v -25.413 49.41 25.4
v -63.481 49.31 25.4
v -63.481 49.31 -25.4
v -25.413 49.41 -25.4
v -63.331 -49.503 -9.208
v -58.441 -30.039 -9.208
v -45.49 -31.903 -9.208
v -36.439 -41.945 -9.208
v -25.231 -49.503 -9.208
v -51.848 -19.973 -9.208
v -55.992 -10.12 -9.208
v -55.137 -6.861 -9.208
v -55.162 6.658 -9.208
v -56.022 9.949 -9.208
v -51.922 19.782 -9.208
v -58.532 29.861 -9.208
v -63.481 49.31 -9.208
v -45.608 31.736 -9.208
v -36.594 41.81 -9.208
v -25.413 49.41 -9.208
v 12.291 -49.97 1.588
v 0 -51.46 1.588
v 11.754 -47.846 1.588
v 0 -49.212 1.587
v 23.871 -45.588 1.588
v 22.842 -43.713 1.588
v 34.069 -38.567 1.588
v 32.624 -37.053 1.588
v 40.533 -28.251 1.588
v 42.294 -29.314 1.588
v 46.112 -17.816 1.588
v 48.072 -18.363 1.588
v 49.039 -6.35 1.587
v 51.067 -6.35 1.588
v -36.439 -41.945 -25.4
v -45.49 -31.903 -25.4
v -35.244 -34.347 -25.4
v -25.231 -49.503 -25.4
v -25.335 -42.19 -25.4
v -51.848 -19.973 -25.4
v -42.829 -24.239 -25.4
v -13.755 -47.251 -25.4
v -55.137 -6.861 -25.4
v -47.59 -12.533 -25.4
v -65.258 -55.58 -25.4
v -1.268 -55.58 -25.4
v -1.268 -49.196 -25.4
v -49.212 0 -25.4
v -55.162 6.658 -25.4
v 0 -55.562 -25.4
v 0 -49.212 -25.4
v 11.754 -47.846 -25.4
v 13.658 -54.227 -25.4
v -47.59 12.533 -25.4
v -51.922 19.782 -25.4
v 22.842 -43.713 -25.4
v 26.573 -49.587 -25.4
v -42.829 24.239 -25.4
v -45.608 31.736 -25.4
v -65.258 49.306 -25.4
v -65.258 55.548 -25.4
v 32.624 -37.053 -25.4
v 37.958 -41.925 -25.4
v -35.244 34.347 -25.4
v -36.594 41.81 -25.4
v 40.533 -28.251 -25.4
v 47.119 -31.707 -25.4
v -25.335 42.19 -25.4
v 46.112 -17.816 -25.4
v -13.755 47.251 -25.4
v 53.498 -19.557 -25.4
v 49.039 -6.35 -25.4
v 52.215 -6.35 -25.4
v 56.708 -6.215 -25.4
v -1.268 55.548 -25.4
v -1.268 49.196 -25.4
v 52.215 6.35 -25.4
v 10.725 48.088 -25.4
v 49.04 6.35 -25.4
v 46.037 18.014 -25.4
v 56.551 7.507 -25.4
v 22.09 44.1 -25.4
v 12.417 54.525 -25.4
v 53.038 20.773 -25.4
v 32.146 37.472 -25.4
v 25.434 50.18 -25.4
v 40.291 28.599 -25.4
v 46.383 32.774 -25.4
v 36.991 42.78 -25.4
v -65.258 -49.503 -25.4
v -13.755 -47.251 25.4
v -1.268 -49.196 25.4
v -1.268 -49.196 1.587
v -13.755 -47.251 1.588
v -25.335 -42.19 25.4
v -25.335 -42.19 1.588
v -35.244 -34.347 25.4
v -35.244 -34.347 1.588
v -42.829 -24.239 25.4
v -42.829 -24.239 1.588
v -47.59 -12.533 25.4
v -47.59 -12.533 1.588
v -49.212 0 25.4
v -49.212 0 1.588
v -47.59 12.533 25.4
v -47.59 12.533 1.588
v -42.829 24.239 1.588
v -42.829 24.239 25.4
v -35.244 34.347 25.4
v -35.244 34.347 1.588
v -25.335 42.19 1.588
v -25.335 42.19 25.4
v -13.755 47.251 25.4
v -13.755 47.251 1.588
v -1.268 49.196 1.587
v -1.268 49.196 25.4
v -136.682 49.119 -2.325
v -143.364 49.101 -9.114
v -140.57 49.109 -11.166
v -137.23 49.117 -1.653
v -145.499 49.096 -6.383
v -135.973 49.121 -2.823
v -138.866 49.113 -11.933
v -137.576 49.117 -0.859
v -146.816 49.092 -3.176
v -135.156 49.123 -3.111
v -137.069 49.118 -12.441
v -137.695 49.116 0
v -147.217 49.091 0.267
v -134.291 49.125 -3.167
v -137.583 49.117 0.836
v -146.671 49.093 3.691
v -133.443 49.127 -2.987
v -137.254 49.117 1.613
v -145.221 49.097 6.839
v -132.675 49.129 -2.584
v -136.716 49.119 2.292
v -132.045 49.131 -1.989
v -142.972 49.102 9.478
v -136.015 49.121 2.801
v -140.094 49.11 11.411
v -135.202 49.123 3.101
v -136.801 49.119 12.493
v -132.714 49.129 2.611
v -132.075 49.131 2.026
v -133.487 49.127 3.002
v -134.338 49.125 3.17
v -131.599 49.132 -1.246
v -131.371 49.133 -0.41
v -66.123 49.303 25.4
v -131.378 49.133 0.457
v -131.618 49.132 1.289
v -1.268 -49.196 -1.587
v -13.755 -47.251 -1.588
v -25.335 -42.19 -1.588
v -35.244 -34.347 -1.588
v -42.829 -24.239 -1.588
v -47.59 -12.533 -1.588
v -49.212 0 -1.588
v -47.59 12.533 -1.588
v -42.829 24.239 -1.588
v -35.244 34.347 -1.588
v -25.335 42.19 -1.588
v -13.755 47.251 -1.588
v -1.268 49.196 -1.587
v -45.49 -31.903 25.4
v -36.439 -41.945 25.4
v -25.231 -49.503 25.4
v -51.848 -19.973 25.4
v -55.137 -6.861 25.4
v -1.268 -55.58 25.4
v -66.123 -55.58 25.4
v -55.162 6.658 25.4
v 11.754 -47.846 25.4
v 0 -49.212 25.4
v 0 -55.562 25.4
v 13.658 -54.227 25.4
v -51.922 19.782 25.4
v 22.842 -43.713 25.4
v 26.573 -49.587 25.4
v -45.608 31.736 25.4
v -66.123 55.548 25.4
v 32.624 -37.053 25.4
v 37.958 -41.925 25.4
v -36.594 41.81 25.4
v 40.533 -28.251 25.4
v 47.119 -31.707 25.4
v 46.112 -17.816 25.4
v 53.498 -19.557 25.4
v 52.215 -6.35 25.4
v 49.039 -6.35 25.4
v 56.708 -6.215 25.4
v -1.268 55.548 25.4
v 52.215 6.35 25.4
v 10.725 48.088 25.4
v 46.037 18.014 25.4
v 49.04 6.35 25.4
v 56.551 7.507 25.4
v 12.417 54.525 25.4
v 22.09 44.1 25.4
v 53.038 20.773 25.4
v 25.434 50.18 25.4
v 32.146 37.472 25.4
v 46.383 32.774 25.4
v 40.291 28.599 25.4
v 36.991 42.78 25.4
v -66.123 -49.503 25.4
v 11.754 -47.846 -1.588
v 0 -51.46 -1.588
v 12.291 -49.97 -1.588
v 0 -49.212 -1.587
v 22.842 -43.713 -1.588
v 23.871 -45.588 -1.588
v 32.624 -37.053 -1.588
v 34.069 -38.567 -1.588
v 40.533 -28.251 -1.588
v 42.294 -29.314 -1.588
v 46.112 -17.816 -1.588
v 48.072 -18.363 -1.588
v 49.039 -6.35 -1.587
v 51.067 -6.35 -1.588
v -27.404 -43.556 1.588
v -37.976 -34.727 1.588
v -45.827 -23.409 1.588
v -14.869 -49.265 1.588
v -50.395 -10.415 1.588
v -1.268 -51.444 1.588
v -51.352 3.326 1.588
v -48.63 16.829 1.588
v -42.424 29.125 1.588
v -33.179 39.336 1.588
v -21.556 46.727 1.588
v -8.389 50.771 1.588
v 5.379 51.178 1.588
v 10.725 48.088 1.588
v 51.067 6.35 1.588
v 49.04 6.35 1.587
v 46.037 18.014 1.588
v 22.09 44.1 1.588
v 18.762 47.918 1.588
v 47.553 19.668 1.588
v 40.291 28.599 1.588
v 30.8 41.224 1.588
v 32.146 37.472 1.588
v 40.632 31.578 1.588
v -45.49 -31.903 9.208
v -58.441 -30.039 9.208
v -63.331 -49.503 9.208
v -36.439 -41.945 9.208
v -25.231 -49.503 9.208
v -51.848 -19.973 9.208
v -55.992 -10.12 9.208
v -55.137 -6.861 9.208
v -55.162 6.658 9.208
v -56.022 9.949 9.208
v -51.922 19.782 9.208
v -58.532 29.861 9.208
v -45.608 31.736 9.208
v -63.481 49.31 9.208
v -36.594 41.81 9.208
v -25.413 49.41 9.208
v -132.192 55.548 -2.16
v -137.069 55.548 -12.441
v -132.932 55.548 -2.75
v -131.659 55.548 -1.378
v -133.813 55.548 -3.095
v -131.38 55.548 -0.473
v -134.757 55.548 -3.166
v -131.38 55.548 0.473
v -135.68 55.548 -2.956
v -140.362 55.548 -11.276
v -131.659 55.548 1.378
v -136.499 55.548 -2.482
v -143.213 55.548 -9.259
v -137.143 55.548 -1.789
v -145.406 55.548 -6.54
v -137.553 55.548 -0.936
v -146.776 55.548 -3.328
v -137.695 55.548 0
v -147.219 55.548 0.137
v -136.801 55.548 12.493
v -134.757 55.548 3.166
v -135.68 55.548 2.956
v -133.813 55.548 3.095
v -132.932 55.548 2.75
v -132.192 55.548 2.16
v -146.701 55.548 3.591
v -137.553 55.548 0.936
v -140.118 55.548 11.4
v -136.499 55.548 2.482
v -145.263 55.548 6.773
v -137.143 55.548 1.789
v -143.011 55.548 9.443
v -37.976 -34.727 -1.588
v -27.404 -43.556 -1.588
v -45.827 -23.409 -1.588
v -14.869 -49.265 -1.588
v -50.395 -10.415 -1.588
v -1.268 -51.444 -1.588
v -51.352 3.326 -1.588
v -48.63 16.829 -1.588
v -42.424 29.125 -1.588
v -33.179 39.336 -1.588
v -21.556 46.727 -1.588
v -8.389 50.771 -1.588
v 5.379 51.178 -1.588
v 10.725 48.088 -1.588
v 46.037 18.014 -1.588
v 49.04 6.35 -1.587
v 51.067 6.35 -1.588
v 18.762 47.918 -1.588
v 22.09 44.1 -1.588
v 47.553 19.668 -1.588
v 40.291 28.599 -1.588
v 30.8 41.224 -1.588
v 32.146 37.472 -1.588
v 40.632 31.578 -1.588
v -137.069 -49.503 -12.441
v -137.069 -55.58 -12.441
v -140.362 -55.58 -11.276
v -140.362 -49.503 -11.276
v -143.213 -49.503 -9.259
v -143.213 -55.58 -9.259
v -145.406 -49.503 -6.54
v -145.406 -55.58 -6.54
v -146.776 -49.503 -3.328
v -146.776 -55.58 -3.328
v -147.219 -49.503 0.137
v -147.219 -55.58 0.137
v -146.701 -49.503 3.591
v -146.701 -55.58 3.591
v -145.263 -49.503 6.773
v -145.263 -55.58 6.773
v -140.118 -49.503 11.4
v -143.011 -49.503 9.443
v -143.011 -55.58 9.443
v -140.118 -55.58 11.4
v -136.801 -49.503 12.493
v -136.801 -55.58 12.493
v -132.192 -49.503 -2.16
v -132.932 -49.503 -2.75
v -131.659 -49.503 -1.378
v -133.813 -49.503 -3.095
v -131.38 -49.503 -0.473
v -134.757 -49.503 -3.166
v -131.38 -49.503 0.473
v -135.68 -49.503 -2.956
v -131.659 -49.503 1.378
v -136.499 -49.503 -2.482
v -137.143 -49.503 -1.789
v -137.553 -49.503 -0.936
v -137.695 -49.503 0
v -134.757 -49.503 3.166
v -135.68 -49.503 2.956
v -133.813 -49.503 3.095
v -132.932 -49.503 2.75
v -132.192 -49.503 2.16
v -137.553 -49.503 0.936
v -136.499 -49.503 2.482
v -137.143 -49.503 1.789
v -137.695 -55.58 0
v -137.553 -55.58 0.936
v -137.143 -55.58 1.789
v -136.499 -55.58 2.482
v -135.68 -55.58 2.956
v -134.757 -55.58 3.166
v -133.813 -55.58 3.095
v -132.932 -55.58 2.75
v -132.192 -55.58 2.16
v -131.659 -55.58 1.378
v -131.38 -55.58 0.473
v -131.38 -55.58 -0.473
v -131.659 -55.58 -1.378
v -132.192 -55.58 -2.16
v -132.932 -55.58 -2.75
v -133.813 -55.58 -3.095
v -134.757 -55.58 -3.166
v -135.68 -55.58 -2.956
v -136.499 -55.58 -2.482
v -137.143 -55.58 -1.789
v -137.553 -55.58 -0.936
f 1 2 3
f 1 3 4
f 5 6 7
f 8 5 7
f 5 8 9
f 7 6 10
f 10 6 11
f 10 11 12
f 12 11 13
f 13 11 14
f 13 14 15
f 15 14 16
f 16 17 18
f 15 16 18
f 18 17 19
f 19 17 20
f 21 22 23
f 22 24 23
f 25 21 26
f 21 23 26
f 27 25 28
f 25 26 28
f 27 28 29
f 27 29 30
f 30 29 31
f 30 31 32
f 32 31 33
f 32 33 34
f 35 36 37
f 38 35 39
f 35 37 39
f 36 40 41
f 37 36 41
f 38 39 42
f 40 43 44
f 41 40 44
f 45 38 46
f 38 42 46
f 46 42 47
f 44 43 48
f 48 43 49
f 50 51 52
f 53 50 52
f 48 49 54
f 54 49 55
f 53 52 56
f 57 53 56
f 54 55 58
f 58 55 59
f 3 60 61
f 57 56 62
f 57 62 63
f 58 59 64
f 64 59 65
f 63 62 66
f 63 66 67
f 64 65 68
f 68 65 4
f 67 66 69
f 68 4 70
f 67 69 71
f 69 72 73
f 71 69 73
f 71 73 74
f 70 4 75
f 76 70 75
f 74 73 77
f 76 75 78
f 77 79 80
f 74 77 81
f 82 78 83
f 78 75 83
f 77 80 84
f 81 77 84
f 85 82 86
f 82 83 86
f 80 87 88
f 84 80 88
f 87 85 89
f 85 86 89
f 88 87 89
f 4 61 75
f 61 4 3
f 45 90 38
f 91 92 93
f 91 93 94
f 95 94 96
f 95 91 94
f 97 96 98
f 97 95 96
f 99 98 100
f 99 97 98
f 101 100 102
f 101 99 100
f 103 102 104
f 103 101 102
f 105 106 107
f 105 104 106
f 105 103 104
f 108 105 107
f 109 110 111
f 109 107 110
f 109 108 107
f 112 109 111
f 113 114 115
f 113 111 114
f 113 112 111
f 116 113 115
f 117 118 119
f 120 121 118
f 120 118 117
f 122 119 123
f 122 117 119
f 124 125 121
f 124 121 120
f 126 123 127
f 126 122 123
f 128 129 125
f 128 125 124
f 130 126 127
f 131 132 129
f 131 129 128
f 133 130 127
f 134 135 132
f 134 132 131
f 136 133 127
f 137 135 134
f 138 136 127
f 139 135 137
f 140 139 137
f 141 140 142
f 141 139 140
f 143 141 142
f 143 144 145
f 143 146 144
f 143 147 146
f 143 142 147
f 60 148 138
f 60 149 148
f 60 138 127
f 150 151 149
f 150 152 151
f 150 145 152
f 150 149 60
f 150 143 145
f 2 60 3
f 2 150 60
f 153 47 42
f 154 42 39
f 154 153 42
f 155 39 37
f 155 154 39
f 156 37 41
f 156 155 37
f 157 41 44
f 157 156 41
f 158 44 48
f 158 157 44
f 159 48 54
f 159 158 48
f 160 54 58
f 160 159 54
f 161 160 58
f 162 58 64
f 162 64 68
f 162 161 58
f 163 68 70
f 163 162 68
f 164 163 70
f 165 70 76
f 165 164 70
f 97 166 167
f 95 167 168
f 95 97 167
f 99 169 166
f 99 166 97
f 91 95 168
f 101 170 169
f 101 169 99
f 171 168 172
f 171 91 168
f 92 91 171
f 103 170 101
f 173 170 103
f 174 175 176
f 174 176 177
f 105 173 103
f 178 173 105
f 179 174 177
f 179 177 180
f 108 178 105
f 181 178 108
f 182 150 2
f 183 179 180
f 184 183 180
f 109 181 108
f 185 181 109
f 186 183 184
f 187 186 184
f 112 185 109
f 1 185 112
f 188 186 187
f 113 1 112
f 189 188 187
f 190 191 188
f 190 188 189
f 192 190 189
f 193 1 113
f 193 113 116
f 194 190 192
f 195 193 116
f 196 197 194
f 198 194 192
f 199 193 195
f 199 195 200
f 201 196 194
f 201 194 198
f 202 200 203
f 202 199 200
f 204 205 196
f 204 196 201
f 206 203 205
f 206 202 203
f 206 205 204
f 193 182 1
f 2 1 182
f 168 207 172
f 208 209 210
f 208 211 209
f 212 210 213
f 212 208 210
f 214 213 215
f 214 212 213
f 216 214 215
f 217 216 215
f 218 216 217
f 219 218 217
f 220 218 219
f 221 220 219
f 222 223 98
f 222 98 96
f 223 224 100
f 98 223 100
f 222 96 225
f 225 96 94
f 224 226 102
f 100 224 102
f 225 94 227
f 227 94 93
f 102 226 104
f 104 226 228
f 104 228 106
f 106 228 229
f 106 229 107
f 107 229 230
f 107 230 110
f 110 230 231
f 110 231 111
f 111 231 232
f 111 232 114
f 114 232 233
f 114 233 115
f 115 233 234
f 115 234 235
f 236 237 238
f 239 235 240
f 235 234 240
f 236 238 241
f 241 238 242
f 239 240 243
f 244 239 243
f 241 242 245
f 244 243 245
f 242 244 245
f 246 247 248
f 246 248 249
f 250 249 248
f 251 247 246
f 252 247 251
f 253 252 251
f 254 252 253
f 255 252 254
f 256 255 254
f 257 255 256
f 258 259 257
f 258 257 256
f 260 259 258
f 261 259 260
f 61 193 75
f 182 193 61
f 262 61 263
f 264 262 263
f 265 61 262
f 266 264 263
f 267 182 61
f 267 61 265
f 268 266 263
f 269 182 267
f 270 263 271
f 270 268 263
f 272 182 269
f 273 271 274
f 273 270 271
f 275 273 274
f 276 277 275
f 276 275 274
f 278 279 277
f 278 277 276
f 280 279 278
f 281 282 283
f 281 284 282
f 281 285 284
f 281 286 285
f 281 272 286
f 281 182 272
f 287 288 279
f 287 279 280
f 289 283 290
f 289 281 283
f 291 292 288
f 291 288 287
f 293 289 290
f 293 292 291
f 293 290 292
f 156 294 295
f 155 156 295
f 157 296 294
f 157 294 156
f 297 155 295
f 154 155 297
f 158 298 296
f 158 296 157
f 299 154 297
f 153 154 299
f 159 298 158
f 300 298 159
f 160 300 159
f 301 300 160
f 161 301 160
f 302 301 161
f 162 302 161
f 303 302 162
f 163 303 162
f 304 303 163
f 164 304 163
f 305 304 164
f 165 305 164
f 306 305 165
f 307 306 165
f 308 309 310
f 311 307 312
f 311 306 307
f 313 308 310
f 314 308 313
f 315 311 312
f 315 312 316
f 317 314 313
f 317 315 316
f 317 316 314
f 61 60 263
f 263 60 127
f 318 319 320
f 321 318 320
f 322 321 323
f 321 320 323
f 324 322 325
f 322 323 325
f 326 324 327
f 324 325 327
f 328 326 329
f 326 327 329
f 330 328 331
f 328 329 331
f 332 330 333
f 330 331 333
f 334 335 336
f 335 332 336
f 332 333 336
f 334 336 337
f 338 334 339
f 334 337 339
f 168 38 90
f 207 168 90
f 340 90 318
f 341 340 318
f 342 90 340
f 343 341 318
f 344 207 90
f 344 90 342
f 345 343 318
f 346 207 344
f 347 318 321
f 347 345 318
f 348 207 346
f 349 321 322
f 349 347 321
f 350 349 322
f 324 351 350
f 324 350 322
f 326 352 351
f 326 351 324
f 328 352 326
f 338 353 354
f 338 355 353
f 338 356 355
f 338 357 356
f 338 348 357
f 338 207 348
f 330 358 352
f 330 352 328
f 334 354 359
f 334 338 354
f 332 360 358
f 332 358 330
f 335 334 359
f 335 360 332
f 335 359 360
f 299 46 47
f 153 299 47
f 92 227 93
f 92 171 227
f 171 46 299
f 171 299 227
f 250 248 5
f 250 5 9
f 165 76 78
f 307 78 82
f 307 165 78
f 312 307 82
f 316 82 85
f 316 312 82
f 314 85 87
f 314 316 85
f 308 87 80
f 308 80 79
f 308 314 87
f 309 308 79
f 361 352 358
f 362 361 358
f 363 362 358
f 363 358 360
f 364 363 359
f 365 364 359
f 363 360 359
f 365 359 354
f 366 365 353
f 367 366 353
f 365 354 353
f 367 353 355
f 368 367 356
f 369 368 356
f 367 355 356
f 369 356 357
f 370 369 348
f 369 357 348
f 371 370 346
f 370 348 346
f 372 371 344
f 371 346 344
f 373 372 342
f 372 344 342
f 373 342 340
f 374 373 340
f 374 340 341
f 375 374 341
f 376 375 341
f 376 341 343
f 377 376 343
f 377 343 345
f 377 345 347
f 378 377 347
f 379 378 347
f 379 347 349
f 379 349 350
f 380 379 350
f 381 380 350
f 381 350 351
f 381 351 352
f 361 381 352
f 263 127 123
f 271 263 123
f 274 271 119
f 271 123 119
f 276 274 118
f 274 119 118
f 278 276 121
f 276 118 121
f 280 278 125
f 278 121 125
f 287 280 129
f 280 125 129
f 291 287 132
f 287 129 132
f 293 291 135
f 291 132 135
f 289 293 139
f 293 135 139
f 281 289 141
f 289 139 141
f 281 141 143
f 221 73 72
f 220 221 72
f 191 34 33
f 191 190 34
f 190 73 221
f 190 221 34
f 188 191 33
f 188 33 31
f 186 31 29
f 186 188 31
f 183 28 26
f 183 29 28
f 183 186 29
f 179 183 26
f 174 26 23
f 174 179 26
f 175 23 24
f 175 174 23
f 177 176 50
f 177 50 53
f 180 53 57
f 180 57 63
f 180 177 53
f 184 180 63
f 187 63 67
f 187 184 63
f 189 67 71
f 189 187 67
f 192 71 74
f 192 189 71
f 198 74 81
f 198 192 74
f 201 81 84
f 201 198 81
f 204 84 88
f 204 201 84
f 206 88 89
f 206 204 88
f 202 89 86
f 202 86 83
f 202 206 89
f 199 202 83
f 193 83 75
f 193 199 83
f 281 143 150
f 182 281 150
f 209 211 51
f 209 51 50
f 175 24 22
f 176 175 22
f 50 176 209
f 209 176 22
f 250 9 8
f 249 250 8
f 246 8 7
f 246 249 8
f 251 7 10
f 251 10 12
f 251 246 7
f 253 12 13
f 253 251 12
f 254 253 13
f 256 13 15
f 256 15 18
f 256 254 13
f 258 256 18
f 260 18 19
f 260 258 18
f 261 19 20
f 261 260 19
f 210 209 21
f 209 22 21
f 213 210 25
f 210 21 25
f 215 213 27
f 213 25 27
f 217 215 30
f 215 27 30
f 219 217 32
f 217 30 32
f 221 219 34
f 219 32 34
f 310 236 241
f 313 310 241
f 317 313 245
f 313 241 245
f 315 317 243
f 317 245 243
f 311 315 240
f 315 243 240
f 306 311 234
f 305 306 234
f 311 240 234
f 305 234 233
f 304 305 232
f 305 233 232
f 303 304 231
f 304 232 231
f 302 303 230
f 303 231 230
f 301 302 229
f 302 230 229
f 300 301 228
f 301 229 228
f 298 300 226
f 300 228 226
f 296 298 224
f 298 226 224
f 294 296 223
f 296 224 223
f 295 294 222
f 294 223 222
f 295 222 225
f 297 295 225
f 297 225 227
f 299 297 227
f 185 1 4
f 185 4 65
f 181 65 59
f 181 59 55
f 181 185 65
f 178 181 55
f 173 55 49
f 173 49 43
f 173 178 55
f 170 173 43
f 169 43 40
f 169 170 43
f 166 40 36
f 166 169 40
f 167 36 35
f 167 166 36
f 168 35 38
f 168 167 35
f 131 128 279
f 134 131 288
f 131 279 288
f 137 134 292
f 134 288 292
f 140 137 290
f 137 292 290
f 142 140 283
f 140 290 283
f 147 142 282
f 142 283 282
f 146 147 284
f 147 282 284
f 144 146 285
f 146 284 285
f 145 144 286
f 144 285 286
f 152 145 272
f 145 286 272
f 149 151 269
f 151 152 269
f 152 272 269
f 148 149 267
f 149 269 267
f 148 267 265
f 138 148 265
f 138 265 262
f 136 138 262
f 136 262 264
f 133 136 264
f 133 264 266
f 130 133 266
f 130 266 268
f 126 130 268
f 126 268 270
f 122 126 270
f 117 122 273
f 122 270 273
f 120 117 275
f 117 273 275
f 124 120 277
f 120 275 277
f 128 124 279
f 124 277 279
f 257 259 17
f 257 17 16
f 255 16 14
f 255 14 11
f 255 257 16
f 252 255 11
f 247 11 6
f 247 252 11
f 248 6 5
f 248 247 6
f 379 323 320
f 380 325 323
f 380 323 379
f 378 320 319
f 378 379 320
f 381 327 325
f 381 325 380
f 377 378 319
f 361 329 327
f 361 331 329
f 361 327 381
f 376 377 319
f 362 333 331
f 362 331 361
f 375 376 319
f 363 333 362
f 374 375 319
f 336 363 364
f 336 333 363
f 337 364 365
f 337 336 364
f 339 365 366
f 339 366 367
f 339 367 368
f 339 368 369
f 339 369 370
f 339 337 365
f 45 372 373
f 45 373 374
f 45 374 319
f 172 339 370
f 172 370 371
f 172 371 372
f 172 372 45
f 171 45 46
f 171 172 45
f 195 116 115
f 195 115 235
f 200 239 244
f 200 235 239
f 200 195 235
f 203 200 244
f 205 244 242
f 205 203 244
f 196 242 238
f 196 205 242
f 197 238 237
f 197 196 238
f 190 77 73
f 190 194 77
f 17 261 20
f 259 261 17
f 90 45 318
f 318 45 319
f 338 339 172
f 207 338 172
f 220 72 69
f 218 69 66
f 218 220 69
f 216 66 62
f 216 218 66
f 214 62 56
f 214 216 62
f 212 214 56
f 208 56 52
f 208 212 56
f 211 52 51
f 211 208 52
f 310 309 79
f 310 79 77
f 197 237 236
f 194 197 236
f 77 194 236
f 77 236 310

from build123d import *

# Parameters (mm, degrees)
F1_DEPTH  = 25.4
F3_DEPTH  = 9.2075
F4_DEPTH  = 25.4
F6_DEPTH  = 120.65
F7_R      = 3.175
F8_DEPTH  = 114.3
F9_R      = 51.459808
F10_DEPTH = 1.5875


with BuildPart() as f1:
    # F0 (on Top) → F1 (new body, symmetric)
    with BuildSketch(Plane.XY):
        with BuildLine():
            ThreePointArc((-1.268059, -49.19616), (-49.2125, 0), (-1.268059, 49.19616))
            Line((-1.268059, 49.19616), (-1.268059, 55.548028))
            Line((-1.268059, 55.548028), (-147.318059, 55.548028))
            Line((-147.318059, 55.548028), (-147.318059, 49.091056))
            Line((-147.318059, 49.091056), (-63.481436, 49.310384))
            Line((-63.481436, 49.310384), (-25.413497, 49.409974))
            ThreePointArc((-25.413497, 49.409974), (-55.562406, -0.102265), (-25.231443, -49.503189))
            Line((-25.231443, -49.503189), (-63.331443, -49.503189))
            Line((-63.331443, -49.503189), (-69.681443, -49.503189))
            Line((-69.681443, -49.503189), (-147.318059, -49.503189))
            Line((-147.318059, -49.503189), (-147.318059, -55.580053))
            Line((-147.318059, -55.580053), (-1.268059, -55.580053))
            Line((-1.268059, -55.580053), (-1.268059, -49.19616))
        make_face()
    extrude(amount=F1_DEPTH, both=True)

    # F0 (on Top) → F4 (join, symmetric)
    with BuildSketch(Plane.XY):
        with BuildLine():
            ThreePointArc((49.038942, -6.35), (32.623699, -37.053289), (0, -49.2125))
            Line((0, -49.2125), (0, -55.5625))
            ThreePointArc((0, -55.5625), (57.054302, 0.651138), (-1.268059, 55.548028))
            Line((-1.268059, 55.548028), (-1.268059, 49.19616))
            ThreePointArc((-1.268059, 49.19616), (32.145877, 37.471603), (49.039728, 6.35))
            Line((49.039728, 6.35), (52.214728, 6.35))
            Line((52.214728, 6.35), (52.214728, -6.35))
            Line((52.214728, -6.35), (49.038942, -6.35))
        make_face()
    extrude(amount=F4_DEPTH, both=True)

    # F5 (on face) → F6 (cut)
    with BuildSketch(Plane.XZ.offset(55.580053)):
        with BuildLine():
            ThreePointArc((-137.069367, -12.441399), (-147.218809, 0.136694), (-136.80097, 12.493402))
            Line((-136.80097, 12.493402), (-64.669545, 25.665354))
            Line((-64.669545, 25.665354), (-147.4055, 25.665354))
            Line((-147.4055, 25.665354), (-147.4055, -25.506219))
            Line((-147.4055, -25.506219), (-64.669545, -25.506219))
            Line((-64.669545, -25.506219), (-137.069367, -12.441399))
        make_face()
    extrude(amount=-F6_DEPTH, mode=Mode.SUBTRACT)

    # F7 (on face) → F8 (cut)
    with BuildSketch(Plane(origin=(0, 55.548028, 0), x_dir=(-1, 0, 0), z_dir=(0, 1, 0))):
        with Locations((134.519545, 0)):
            Circle(F7_R)
    extrude(amount=-F8_DEPTH, mode=Mode.SUBTRACT)

    # F9 (on Top) → F10 (cut, symmetric)
    with BuildSketch(Plane.XY):
        Circle(F9_R)
    extrude(amount=F10_DEPTH, both=True, mode=Mode.SUBTRACT)


with BuildPart() as f3:
    # F0 (on Top) → F3 (new body, symmetric)
    with BuildSketch(Plane.XY):
        with BuildLine():
            Line((-25.413497, 49.409974), (-63.481436, 49.310384))
            ThreePointArc((-63.481436, 49.310384), (-55.696396, -0.084699), (-63.331443, -49.503189))
            Line((-63.331443, -49.503189), (-25.231443, -49.503189))
            ThreePointArc((-25.231443, -49.503189), (-55.562406, -0.102265), (-25.413497, 49.409974))
        make_face()
    extrude(amount=F3_DEPTH, both=True)


solid = Compound([f1.part, f3.part])
